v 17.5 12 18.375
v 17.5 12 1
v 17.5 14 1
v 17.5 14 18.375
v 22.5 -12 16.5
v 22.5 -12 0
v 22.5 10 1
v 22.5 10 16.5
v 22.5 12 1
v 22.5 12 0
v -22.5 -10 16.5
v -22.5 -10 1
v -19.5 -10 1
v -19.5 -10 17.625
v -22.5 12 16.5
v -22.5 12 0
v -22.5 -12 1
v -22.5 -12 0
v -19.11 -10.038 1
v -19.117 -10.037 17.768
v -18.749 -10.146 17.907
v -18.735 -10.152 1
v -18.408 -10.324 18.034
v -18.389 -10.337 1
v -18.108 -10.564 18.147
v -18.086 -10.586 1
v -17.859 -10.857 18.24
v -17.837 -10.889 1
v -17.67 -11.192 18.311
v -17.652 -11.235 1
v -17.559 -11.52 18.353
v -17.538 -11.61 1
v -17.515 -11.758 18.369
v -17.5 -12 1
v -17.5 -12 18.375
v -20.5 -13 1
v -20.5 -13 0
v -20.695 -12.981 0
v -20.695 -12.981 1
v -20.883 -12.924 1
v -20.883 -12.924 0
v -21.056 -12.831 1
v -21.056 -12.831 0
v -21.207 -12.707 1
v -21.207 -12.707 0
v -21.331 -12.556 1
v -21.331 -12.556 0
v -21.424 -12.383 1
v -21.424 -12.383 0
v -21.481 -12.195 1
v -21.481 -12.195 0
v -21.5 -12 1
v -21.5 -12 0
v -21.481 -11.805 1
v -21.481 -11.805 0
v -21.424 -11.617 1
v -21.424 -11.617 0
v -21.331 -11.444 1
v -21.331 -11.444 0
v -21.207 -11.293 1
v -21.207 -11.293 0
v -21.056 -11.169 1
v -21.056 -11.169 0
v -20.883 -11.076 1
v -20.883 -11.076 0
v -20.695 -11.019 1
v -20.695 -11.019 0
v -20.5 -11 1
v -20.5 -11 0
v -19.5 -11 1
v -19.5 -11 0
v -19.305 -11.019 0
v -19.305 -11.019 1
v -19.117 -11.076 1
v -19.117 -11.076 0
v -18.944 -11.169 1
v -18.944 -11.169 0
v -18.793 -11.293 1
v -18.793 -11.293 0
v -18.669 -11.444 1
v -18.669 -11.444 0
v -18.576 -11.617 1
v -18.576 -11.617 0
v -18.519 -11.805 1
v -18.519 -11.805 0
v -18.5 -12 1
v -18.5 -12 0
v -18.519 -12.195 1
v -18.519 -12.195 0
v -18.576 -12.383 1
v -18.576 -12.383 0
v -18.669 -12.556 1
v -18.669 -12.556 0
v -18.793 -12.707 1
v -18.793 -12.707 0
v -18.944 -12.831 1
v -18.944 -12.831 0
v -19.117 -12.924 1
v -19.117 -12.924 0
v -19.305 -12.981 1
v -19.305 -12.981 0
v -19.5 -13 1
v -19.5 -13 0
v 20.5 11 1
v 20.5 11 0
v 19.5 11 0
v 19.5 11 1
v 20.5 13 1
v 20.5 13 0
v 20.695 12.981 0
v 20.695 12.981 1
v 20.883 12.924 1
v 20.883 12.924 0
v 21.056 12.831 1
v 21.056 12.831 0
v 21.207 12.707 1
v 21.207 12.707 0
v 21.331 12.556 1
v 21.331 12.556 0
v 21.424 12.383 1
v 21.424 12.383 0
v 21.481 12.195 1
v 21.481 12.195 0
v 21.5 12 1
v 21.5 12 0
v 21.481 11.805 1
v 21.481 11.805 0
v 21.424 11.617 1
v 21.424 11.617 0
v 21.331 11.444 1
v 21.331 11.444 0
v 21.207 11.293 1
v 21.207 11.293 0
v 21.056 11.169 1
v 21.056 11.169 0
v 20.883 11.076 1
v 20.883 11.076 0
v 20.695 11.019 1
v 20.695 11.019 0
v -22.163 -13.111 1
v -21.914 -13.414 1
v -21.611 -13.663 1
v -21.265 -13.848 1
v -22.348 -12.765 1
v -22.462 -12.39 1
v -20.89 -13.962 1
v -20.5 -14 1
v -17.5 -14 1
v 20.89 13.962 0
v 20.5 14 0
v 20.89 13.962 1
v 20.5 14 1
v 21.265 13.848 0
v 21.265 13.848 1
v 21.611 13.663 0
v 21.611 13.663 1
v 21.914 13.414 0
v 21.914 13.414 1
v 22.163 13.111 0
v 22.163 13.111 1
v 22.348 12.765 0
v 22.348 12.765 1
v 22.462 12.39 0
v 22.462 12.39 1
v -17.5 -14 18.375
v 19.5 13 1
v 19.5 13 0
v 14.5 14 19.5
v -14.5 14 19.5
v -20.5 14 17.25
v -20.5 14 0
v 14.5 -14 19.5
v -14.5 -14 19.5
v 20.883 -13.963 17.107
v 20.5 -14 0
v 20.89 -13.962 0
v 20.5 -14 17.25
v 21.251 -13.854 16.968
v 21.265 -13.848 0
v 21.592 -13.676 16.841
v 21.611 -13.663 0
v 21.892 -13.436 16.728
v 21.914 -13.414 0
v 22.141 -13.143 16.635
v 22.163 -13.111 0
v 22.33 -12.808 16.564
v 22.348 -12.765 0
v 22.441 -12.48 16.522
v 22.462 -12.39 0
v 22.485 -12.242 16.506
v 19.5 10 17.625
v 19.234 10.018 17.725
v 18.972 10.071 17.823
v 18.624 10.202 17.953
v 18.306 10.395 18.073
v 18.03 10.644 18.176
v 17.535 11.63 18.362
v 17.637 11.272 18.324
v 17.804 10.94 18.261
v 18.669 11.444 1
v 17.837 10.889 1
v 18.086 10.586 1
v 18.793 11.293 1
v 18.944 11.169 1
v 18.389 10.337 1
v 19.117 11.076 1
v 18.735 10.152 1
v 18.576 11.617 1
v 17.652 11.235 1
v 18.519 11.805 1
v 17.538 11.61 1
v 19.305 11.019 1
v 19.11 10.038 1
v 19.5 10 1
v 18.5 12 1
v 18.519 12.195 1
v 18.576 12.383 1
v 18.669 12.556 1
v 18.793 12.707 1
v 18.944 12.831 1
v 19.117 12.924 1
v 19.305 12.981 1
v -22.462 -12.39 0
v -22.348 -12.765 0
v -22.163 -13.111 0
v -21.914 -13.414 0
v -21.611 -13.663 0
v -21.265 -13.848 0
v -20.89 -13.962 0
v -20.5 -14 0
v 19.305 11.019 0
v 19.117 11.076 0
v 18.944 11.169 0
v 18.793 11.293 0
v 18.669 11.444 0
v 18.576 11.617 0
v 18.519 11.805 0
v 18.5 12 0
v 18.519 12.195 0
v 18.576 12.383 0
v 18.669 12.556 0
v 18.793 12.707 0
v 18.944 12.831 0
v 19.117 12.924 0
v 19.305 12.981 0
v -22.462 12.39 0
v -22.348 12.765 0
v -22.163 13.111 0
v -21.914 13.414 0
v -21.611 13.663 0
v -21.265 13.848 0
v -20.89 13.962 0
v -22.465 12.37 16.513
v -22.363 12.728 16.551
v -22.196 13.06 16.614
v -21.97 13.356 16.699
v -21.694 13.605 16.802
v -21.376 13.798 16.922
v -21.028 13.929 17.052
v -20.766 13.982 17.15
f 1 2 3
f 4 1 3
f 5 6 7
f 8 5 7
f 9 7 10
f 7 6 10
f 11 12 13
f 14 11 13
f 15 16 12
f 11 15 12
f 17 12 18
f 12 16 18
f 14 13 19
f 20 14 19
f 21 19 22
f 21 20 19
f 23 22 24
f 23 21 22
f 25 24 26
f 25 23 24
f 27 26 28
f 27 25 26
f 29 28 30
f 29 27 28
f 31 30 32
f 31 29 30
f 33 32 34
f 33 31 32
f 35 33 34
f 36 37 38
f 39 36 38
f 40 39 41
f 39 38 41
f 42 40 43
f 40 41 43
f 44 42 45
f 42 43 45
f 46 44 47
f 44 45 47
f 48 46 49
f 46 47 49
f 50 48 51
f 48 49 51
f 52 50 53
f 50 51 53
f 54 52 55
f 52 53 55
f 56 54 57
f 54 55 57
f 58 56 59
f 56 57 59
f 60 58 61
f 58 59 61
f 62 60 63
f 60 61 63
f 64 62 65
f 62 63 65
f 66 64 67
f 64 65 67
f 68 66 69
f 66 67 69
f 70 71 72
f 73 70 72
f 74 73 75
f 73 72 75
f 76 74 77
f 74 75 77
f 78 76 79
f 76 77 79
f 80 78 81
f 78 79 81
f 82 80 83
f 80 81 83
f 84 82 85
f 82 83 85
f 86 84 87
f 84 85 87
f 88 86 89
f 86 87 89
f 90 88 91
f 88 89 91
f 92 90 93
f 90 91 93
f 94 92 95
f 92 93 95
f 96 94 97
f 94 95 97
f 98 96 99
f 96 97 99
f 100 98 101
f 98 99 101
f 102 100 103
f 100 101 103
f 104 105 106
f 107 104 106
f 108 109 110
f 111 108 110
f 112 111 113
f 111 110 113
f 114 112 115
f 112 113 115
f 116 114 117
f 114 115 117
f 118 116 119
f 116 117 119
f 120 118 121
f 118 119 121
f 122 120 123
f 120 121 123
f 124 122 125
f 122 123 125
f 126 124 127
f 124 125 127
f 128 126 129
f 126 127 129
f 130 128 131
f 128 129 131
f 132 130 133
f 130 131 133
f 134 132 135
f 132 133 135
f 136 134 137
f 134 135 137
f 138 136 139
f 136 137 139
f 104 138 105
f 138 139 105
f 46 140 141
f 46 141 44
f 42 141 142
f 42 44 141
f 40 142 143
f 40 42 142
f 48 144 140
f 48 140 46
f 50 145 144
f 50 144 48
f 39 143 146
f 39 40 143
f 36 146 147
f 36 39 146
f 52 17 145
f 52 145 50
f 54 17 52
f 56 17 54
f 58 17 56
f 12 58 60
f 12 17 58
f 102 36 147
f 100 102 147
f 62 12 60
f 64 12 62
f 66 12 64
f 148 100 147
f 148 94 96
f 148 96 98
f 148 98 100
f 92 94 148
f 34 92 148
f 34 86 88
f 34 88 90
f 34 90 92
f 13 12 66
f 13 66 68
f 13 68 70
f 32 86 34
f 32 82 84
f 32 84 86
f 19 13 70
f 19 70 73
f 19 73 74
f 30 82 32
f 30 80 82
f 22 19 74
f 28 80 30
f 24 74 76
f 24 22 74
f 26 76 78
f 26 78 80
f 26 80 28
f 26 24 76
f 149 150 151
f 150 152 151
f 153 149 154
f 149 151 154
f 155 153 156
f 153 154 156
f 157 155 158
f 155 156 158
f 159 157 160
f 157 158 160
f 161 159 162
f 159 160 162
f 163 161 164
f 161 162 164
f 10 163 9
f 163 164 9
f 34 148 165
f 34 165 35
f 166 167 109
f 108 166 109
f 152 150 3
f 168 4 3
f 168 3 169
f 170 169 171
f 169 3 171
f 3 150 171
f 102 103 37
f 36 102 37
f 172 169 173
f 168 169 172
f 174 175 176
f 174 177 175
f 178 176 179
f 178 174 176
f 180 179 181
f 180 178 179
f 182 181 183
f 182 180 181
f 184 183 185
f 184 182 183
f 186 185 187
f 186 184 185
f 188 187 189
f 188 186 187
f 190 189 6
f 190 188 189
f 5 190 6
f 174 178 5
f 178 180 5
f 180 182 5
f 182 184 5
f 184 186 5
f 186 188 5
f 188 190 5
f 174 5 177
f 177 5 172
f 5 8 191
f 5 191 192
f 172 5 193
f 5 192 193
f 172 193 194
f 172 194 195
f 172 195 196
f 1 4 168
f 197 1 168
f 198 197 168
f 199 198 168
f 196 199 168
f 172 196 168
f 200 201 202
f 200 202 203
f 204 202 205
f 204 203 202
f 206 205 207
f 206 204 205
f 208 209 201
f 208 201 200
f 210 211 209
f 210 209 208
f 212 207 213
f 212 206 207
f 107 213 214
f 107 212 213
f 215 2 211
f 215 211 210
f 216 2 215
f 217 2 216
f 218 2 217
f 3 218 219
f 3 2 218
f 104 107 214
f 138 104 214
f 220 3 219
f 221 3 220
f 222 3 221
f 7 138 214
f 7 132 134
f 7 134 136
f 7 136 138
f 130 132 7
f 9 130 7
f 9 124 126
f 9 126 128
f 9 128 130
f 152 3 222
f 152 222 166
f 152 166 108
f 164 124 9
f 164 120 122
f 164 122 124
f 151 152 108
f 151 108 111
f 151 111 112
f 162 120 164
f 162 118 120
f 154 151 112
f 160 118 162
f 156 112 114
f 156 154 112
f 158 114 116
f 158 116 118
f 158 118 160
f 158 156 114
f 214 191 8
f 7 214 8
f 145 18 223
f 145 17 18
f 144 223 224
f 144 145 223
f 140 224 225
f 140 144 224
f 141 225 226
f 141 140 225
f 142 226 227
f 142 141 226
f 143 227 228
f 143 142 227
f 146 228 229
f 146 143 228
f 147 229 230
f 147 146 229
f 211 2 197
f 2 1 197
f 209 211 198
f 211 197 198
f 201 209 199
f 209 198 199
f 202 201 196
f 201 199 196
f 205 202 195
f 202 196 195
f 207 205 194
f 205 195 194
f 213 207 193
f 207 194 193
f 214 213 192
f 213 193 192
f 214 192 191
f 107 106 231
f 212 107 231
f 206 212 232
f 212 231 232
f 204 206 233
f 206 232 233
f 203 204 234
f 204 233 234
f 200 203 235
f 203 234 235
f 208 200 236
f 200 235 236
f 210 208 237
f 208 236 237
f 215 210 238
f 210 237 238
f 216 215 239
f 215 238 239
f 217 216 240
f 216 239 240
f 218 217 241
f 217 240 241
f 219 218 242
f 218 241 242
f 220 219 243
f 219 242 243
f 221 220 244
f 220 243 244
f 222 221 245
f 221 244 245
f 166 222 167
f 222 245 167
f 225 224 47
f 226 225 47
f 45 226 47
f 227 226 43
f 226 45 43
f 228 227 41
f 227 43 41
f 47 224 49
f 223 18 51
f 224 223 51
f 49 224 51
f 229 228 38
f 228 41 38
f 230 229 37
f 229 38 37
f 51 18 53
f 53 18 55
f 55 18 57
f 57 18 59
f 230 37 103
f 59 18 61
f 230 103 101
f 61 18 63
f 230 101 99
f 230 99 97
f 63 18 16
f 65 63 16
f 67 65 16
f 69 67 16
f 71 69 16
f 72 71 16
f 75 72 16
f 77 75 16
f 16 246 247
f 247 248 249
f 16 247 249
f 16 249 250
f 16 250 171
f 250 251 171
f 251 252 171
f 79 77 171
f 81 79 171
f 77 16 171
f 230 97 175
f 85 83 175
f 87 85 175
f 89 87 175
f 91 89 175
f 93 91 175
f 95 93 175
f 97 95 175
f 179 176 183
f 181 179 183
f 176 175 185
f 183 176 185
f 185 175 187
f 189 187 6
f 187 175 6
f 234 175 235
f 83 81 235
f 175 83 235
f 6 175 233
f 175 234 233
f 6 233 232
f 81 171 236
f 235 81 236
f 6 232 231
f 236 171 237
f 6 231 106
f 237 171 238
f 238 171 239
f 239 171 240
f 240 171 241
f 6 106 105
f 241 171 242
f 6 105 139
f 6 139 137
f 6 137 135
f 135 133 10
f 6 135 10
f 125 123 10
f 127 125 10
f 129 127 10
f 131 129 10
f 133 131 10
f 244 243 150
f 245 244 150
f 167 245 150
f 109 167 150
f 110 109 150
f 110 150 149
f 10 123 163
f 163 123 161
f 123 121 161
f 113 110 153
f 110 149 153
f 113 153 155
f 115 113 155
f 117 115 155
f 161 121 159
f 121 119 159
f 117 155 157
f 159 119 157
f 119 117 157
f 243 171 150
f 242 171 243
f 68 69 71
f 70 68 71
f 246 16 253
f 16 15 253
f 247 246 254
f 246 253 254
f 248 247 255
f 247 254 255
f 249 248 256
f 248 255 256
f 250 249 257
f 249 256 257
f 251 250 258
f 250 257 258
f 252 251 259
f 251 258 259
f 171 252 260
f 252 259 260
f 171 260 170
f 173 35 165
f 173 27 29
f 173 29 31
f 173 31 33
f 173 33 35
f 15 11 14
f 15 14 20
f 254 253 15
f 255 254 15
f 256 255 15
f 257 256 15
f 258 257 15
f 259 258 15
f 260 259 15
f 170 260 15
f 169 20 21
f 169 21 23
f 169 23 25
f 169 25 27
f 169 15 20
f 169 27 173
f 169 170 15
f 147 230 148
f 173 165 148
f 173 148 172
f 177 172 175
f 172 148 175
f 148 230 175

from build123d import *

# Parameters (mm, degrees)
F0_W        = 5
F0_H        = 4
F1_DEPTH    = 19.5
F2_T1_DEPTH = 69.5019292892
F3_START    = 1
F3_DEPTH    = 24
F4_R        = 2


# Not quite as in the source:
# - a fillet or chamfer that OpenCascade refuses, or shapes differently, is made with other operations: its cross-section is extruded or revolved along the edge and cut away or added


with BuildPart() as f1:
    # F0 (on Top) → F1 (new body)
    with BuildSketch(Plane.XY):
        Polygon((17.5, 14), (-22.5, 14), (-22.5, -10), (-17.5, -10), (-17.5, -14), (22.5, -14), (22.5, 10), (17.5, 10), align=None)
        with Locations((20, 12)):
            Rectangle(F0_W, F0_H)
        with BuildLine():
            ThreePointArc((19.5, 11), (18.5, 12), (19.5, 13))
            Line((19.5, 13), (20.5, 13))
            ThreePointArc((20.5, 13), (21.5, 12), (20.5, 11))
            Line((20.5, 11), (19.5, 11))
        make_face(mode=Mode.SUBTRACT)
        with Locations((-20, -12)):
            Rectangle(F0_W, F0_H)
        with BuildLine():
            ThreePointArc((-20.5, -13), (-21.5, -12), (-20.5, -11))
            Line((-20.5, -11), (-19.5, -11))
            ThreePointArc((-19.5, -11), (-18.5, -12), (-19.5, -13))
            Line((-19.5, -13), (-20.5, -13))
        make_face(mode=Mode.SUBTRACT)
    extrude(amount=F1_DEPTH)

    # F2: chamfer of 3 x 8 on 2 edges, made by hand

    # F2_s2 → F2_t1 (cut)
    with BuildSketch(Plane.XZ.offset(-34.7509646446)):
        Polygon((-22.5, 16.5), (-14.5, 19.5), (-22.5, 19.5), align=None)
        Polygon((22.5, 16.5), (14.5, 19.5), (22.5, 19.5), align=None)
    extrude(amount=F2_T1_DEPTH, mode=Mode.SUBTRACT)

    # F0 (on Top) → F3 (cut)
    with BuildSketch(Plane.XY.offset(F3_START)):
        with Locations((-20, -12)):
            Rectangle(F0_W, F0_H)
        with BuildLine():
            ThreePointArc((-20.5, -13), (-21.5, -12), (-20.5, -11))
            Line((-20.5, -11), (-19.5, -11))
            ThreePointArc((-19.5, -11), (-18.5, -12), (-19.5, -13))
            Line((-19.5, -13), (-20.5, -13))
        make_face(mode=Mode.SUBTRACT)
        with Locations((20, 12)):
            Rectangle(F0_W, F0_H)
        with BuildLine():
            ThreePointArc((19.5, 11), (18.5, 12), (19.5, 13))
            Line((19.5, 13), (20.5, 13))
            ThreePointArc((20.5, 13), (21.5, 12), (20.5, 11))
            Line((20.5, 11), (19.5, 11))
        make_face(mode=Mode.SUBTRACT)
    extrude(amount=F3_DEPTH, mode=Mode.SUBTRACT)

    # F4
    f4_edges = [f1.edges().sort_by_distance(p)[0] for p in [
        (-17.5, -10, 9.6875),
        (17.5, 10, 9.6875),
        (22.5, -14, 8.25),
        (22.5, 14, 0.5),
        (-22.5, 14, 8.25),
        (-22.5, -14, 0.5),
    ]]
    fillet(f4_edges, radius=F4_R)


solid = f1.part
